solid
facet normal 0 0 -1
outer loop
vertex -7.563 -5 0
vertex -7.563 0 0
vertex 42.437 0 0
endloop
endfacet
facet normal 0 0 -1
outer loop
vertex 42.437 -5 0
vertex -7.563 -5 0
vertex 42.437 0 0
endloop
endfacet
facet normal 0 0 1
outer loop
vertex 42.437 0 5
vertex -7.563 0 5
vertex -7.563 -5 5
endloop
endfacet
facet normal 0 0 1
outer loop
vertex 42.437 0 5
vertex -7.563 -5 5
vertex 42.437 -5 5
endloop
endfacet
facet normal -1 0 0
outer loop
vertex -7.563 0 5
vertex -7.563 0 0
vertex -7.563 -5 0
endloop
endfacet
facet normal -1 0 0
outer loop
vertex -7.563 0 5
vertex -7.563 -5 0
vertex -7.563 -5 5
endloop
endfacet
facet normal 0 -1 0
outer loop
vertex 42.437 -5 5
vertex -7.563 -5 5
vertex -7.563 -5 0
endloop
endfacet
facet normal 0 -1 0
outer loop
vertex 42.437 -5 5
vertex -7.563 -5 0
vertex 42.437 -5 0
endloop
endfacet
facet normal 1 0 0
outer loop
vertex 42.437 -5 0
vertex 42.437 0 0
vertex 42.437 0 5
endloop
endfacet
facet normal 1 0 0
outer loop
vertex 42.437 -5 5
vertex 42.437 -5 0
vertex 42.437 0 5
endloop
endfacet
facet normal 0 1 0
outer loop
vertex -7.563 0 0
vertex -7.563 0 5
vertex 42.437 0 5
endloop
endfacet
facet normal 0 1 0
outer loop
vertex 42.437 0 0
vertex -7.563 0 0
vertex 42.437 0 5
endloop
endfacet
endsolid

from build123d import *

# Parameters (mm, degrees)
F0_W     = 50
F0_H     = 5
F1_DEPTH = 5
F2_W     = 5
F2_H     = 50
F3_DEPTH = 5


with BuildPart() as f1:
    # F0 (on Front) → F1 (new body)
    with BuildSketch(Plane.XZ):
        with Locations((17.437404, 2.5)):
            Rectangle(F0_W, F0_H)
    extrude(amount=F1_DEPTH)


with BuildPart() as f3:
    # F2 (on Front) → F3 (new body)
    with BuildSketch(Plane.XZ):
        with Locations((-58.303325, 25)):
            Rectangle(F2_W, F2_H)
    extrude(amount=F3_DEPTH)


solid = f1.part
